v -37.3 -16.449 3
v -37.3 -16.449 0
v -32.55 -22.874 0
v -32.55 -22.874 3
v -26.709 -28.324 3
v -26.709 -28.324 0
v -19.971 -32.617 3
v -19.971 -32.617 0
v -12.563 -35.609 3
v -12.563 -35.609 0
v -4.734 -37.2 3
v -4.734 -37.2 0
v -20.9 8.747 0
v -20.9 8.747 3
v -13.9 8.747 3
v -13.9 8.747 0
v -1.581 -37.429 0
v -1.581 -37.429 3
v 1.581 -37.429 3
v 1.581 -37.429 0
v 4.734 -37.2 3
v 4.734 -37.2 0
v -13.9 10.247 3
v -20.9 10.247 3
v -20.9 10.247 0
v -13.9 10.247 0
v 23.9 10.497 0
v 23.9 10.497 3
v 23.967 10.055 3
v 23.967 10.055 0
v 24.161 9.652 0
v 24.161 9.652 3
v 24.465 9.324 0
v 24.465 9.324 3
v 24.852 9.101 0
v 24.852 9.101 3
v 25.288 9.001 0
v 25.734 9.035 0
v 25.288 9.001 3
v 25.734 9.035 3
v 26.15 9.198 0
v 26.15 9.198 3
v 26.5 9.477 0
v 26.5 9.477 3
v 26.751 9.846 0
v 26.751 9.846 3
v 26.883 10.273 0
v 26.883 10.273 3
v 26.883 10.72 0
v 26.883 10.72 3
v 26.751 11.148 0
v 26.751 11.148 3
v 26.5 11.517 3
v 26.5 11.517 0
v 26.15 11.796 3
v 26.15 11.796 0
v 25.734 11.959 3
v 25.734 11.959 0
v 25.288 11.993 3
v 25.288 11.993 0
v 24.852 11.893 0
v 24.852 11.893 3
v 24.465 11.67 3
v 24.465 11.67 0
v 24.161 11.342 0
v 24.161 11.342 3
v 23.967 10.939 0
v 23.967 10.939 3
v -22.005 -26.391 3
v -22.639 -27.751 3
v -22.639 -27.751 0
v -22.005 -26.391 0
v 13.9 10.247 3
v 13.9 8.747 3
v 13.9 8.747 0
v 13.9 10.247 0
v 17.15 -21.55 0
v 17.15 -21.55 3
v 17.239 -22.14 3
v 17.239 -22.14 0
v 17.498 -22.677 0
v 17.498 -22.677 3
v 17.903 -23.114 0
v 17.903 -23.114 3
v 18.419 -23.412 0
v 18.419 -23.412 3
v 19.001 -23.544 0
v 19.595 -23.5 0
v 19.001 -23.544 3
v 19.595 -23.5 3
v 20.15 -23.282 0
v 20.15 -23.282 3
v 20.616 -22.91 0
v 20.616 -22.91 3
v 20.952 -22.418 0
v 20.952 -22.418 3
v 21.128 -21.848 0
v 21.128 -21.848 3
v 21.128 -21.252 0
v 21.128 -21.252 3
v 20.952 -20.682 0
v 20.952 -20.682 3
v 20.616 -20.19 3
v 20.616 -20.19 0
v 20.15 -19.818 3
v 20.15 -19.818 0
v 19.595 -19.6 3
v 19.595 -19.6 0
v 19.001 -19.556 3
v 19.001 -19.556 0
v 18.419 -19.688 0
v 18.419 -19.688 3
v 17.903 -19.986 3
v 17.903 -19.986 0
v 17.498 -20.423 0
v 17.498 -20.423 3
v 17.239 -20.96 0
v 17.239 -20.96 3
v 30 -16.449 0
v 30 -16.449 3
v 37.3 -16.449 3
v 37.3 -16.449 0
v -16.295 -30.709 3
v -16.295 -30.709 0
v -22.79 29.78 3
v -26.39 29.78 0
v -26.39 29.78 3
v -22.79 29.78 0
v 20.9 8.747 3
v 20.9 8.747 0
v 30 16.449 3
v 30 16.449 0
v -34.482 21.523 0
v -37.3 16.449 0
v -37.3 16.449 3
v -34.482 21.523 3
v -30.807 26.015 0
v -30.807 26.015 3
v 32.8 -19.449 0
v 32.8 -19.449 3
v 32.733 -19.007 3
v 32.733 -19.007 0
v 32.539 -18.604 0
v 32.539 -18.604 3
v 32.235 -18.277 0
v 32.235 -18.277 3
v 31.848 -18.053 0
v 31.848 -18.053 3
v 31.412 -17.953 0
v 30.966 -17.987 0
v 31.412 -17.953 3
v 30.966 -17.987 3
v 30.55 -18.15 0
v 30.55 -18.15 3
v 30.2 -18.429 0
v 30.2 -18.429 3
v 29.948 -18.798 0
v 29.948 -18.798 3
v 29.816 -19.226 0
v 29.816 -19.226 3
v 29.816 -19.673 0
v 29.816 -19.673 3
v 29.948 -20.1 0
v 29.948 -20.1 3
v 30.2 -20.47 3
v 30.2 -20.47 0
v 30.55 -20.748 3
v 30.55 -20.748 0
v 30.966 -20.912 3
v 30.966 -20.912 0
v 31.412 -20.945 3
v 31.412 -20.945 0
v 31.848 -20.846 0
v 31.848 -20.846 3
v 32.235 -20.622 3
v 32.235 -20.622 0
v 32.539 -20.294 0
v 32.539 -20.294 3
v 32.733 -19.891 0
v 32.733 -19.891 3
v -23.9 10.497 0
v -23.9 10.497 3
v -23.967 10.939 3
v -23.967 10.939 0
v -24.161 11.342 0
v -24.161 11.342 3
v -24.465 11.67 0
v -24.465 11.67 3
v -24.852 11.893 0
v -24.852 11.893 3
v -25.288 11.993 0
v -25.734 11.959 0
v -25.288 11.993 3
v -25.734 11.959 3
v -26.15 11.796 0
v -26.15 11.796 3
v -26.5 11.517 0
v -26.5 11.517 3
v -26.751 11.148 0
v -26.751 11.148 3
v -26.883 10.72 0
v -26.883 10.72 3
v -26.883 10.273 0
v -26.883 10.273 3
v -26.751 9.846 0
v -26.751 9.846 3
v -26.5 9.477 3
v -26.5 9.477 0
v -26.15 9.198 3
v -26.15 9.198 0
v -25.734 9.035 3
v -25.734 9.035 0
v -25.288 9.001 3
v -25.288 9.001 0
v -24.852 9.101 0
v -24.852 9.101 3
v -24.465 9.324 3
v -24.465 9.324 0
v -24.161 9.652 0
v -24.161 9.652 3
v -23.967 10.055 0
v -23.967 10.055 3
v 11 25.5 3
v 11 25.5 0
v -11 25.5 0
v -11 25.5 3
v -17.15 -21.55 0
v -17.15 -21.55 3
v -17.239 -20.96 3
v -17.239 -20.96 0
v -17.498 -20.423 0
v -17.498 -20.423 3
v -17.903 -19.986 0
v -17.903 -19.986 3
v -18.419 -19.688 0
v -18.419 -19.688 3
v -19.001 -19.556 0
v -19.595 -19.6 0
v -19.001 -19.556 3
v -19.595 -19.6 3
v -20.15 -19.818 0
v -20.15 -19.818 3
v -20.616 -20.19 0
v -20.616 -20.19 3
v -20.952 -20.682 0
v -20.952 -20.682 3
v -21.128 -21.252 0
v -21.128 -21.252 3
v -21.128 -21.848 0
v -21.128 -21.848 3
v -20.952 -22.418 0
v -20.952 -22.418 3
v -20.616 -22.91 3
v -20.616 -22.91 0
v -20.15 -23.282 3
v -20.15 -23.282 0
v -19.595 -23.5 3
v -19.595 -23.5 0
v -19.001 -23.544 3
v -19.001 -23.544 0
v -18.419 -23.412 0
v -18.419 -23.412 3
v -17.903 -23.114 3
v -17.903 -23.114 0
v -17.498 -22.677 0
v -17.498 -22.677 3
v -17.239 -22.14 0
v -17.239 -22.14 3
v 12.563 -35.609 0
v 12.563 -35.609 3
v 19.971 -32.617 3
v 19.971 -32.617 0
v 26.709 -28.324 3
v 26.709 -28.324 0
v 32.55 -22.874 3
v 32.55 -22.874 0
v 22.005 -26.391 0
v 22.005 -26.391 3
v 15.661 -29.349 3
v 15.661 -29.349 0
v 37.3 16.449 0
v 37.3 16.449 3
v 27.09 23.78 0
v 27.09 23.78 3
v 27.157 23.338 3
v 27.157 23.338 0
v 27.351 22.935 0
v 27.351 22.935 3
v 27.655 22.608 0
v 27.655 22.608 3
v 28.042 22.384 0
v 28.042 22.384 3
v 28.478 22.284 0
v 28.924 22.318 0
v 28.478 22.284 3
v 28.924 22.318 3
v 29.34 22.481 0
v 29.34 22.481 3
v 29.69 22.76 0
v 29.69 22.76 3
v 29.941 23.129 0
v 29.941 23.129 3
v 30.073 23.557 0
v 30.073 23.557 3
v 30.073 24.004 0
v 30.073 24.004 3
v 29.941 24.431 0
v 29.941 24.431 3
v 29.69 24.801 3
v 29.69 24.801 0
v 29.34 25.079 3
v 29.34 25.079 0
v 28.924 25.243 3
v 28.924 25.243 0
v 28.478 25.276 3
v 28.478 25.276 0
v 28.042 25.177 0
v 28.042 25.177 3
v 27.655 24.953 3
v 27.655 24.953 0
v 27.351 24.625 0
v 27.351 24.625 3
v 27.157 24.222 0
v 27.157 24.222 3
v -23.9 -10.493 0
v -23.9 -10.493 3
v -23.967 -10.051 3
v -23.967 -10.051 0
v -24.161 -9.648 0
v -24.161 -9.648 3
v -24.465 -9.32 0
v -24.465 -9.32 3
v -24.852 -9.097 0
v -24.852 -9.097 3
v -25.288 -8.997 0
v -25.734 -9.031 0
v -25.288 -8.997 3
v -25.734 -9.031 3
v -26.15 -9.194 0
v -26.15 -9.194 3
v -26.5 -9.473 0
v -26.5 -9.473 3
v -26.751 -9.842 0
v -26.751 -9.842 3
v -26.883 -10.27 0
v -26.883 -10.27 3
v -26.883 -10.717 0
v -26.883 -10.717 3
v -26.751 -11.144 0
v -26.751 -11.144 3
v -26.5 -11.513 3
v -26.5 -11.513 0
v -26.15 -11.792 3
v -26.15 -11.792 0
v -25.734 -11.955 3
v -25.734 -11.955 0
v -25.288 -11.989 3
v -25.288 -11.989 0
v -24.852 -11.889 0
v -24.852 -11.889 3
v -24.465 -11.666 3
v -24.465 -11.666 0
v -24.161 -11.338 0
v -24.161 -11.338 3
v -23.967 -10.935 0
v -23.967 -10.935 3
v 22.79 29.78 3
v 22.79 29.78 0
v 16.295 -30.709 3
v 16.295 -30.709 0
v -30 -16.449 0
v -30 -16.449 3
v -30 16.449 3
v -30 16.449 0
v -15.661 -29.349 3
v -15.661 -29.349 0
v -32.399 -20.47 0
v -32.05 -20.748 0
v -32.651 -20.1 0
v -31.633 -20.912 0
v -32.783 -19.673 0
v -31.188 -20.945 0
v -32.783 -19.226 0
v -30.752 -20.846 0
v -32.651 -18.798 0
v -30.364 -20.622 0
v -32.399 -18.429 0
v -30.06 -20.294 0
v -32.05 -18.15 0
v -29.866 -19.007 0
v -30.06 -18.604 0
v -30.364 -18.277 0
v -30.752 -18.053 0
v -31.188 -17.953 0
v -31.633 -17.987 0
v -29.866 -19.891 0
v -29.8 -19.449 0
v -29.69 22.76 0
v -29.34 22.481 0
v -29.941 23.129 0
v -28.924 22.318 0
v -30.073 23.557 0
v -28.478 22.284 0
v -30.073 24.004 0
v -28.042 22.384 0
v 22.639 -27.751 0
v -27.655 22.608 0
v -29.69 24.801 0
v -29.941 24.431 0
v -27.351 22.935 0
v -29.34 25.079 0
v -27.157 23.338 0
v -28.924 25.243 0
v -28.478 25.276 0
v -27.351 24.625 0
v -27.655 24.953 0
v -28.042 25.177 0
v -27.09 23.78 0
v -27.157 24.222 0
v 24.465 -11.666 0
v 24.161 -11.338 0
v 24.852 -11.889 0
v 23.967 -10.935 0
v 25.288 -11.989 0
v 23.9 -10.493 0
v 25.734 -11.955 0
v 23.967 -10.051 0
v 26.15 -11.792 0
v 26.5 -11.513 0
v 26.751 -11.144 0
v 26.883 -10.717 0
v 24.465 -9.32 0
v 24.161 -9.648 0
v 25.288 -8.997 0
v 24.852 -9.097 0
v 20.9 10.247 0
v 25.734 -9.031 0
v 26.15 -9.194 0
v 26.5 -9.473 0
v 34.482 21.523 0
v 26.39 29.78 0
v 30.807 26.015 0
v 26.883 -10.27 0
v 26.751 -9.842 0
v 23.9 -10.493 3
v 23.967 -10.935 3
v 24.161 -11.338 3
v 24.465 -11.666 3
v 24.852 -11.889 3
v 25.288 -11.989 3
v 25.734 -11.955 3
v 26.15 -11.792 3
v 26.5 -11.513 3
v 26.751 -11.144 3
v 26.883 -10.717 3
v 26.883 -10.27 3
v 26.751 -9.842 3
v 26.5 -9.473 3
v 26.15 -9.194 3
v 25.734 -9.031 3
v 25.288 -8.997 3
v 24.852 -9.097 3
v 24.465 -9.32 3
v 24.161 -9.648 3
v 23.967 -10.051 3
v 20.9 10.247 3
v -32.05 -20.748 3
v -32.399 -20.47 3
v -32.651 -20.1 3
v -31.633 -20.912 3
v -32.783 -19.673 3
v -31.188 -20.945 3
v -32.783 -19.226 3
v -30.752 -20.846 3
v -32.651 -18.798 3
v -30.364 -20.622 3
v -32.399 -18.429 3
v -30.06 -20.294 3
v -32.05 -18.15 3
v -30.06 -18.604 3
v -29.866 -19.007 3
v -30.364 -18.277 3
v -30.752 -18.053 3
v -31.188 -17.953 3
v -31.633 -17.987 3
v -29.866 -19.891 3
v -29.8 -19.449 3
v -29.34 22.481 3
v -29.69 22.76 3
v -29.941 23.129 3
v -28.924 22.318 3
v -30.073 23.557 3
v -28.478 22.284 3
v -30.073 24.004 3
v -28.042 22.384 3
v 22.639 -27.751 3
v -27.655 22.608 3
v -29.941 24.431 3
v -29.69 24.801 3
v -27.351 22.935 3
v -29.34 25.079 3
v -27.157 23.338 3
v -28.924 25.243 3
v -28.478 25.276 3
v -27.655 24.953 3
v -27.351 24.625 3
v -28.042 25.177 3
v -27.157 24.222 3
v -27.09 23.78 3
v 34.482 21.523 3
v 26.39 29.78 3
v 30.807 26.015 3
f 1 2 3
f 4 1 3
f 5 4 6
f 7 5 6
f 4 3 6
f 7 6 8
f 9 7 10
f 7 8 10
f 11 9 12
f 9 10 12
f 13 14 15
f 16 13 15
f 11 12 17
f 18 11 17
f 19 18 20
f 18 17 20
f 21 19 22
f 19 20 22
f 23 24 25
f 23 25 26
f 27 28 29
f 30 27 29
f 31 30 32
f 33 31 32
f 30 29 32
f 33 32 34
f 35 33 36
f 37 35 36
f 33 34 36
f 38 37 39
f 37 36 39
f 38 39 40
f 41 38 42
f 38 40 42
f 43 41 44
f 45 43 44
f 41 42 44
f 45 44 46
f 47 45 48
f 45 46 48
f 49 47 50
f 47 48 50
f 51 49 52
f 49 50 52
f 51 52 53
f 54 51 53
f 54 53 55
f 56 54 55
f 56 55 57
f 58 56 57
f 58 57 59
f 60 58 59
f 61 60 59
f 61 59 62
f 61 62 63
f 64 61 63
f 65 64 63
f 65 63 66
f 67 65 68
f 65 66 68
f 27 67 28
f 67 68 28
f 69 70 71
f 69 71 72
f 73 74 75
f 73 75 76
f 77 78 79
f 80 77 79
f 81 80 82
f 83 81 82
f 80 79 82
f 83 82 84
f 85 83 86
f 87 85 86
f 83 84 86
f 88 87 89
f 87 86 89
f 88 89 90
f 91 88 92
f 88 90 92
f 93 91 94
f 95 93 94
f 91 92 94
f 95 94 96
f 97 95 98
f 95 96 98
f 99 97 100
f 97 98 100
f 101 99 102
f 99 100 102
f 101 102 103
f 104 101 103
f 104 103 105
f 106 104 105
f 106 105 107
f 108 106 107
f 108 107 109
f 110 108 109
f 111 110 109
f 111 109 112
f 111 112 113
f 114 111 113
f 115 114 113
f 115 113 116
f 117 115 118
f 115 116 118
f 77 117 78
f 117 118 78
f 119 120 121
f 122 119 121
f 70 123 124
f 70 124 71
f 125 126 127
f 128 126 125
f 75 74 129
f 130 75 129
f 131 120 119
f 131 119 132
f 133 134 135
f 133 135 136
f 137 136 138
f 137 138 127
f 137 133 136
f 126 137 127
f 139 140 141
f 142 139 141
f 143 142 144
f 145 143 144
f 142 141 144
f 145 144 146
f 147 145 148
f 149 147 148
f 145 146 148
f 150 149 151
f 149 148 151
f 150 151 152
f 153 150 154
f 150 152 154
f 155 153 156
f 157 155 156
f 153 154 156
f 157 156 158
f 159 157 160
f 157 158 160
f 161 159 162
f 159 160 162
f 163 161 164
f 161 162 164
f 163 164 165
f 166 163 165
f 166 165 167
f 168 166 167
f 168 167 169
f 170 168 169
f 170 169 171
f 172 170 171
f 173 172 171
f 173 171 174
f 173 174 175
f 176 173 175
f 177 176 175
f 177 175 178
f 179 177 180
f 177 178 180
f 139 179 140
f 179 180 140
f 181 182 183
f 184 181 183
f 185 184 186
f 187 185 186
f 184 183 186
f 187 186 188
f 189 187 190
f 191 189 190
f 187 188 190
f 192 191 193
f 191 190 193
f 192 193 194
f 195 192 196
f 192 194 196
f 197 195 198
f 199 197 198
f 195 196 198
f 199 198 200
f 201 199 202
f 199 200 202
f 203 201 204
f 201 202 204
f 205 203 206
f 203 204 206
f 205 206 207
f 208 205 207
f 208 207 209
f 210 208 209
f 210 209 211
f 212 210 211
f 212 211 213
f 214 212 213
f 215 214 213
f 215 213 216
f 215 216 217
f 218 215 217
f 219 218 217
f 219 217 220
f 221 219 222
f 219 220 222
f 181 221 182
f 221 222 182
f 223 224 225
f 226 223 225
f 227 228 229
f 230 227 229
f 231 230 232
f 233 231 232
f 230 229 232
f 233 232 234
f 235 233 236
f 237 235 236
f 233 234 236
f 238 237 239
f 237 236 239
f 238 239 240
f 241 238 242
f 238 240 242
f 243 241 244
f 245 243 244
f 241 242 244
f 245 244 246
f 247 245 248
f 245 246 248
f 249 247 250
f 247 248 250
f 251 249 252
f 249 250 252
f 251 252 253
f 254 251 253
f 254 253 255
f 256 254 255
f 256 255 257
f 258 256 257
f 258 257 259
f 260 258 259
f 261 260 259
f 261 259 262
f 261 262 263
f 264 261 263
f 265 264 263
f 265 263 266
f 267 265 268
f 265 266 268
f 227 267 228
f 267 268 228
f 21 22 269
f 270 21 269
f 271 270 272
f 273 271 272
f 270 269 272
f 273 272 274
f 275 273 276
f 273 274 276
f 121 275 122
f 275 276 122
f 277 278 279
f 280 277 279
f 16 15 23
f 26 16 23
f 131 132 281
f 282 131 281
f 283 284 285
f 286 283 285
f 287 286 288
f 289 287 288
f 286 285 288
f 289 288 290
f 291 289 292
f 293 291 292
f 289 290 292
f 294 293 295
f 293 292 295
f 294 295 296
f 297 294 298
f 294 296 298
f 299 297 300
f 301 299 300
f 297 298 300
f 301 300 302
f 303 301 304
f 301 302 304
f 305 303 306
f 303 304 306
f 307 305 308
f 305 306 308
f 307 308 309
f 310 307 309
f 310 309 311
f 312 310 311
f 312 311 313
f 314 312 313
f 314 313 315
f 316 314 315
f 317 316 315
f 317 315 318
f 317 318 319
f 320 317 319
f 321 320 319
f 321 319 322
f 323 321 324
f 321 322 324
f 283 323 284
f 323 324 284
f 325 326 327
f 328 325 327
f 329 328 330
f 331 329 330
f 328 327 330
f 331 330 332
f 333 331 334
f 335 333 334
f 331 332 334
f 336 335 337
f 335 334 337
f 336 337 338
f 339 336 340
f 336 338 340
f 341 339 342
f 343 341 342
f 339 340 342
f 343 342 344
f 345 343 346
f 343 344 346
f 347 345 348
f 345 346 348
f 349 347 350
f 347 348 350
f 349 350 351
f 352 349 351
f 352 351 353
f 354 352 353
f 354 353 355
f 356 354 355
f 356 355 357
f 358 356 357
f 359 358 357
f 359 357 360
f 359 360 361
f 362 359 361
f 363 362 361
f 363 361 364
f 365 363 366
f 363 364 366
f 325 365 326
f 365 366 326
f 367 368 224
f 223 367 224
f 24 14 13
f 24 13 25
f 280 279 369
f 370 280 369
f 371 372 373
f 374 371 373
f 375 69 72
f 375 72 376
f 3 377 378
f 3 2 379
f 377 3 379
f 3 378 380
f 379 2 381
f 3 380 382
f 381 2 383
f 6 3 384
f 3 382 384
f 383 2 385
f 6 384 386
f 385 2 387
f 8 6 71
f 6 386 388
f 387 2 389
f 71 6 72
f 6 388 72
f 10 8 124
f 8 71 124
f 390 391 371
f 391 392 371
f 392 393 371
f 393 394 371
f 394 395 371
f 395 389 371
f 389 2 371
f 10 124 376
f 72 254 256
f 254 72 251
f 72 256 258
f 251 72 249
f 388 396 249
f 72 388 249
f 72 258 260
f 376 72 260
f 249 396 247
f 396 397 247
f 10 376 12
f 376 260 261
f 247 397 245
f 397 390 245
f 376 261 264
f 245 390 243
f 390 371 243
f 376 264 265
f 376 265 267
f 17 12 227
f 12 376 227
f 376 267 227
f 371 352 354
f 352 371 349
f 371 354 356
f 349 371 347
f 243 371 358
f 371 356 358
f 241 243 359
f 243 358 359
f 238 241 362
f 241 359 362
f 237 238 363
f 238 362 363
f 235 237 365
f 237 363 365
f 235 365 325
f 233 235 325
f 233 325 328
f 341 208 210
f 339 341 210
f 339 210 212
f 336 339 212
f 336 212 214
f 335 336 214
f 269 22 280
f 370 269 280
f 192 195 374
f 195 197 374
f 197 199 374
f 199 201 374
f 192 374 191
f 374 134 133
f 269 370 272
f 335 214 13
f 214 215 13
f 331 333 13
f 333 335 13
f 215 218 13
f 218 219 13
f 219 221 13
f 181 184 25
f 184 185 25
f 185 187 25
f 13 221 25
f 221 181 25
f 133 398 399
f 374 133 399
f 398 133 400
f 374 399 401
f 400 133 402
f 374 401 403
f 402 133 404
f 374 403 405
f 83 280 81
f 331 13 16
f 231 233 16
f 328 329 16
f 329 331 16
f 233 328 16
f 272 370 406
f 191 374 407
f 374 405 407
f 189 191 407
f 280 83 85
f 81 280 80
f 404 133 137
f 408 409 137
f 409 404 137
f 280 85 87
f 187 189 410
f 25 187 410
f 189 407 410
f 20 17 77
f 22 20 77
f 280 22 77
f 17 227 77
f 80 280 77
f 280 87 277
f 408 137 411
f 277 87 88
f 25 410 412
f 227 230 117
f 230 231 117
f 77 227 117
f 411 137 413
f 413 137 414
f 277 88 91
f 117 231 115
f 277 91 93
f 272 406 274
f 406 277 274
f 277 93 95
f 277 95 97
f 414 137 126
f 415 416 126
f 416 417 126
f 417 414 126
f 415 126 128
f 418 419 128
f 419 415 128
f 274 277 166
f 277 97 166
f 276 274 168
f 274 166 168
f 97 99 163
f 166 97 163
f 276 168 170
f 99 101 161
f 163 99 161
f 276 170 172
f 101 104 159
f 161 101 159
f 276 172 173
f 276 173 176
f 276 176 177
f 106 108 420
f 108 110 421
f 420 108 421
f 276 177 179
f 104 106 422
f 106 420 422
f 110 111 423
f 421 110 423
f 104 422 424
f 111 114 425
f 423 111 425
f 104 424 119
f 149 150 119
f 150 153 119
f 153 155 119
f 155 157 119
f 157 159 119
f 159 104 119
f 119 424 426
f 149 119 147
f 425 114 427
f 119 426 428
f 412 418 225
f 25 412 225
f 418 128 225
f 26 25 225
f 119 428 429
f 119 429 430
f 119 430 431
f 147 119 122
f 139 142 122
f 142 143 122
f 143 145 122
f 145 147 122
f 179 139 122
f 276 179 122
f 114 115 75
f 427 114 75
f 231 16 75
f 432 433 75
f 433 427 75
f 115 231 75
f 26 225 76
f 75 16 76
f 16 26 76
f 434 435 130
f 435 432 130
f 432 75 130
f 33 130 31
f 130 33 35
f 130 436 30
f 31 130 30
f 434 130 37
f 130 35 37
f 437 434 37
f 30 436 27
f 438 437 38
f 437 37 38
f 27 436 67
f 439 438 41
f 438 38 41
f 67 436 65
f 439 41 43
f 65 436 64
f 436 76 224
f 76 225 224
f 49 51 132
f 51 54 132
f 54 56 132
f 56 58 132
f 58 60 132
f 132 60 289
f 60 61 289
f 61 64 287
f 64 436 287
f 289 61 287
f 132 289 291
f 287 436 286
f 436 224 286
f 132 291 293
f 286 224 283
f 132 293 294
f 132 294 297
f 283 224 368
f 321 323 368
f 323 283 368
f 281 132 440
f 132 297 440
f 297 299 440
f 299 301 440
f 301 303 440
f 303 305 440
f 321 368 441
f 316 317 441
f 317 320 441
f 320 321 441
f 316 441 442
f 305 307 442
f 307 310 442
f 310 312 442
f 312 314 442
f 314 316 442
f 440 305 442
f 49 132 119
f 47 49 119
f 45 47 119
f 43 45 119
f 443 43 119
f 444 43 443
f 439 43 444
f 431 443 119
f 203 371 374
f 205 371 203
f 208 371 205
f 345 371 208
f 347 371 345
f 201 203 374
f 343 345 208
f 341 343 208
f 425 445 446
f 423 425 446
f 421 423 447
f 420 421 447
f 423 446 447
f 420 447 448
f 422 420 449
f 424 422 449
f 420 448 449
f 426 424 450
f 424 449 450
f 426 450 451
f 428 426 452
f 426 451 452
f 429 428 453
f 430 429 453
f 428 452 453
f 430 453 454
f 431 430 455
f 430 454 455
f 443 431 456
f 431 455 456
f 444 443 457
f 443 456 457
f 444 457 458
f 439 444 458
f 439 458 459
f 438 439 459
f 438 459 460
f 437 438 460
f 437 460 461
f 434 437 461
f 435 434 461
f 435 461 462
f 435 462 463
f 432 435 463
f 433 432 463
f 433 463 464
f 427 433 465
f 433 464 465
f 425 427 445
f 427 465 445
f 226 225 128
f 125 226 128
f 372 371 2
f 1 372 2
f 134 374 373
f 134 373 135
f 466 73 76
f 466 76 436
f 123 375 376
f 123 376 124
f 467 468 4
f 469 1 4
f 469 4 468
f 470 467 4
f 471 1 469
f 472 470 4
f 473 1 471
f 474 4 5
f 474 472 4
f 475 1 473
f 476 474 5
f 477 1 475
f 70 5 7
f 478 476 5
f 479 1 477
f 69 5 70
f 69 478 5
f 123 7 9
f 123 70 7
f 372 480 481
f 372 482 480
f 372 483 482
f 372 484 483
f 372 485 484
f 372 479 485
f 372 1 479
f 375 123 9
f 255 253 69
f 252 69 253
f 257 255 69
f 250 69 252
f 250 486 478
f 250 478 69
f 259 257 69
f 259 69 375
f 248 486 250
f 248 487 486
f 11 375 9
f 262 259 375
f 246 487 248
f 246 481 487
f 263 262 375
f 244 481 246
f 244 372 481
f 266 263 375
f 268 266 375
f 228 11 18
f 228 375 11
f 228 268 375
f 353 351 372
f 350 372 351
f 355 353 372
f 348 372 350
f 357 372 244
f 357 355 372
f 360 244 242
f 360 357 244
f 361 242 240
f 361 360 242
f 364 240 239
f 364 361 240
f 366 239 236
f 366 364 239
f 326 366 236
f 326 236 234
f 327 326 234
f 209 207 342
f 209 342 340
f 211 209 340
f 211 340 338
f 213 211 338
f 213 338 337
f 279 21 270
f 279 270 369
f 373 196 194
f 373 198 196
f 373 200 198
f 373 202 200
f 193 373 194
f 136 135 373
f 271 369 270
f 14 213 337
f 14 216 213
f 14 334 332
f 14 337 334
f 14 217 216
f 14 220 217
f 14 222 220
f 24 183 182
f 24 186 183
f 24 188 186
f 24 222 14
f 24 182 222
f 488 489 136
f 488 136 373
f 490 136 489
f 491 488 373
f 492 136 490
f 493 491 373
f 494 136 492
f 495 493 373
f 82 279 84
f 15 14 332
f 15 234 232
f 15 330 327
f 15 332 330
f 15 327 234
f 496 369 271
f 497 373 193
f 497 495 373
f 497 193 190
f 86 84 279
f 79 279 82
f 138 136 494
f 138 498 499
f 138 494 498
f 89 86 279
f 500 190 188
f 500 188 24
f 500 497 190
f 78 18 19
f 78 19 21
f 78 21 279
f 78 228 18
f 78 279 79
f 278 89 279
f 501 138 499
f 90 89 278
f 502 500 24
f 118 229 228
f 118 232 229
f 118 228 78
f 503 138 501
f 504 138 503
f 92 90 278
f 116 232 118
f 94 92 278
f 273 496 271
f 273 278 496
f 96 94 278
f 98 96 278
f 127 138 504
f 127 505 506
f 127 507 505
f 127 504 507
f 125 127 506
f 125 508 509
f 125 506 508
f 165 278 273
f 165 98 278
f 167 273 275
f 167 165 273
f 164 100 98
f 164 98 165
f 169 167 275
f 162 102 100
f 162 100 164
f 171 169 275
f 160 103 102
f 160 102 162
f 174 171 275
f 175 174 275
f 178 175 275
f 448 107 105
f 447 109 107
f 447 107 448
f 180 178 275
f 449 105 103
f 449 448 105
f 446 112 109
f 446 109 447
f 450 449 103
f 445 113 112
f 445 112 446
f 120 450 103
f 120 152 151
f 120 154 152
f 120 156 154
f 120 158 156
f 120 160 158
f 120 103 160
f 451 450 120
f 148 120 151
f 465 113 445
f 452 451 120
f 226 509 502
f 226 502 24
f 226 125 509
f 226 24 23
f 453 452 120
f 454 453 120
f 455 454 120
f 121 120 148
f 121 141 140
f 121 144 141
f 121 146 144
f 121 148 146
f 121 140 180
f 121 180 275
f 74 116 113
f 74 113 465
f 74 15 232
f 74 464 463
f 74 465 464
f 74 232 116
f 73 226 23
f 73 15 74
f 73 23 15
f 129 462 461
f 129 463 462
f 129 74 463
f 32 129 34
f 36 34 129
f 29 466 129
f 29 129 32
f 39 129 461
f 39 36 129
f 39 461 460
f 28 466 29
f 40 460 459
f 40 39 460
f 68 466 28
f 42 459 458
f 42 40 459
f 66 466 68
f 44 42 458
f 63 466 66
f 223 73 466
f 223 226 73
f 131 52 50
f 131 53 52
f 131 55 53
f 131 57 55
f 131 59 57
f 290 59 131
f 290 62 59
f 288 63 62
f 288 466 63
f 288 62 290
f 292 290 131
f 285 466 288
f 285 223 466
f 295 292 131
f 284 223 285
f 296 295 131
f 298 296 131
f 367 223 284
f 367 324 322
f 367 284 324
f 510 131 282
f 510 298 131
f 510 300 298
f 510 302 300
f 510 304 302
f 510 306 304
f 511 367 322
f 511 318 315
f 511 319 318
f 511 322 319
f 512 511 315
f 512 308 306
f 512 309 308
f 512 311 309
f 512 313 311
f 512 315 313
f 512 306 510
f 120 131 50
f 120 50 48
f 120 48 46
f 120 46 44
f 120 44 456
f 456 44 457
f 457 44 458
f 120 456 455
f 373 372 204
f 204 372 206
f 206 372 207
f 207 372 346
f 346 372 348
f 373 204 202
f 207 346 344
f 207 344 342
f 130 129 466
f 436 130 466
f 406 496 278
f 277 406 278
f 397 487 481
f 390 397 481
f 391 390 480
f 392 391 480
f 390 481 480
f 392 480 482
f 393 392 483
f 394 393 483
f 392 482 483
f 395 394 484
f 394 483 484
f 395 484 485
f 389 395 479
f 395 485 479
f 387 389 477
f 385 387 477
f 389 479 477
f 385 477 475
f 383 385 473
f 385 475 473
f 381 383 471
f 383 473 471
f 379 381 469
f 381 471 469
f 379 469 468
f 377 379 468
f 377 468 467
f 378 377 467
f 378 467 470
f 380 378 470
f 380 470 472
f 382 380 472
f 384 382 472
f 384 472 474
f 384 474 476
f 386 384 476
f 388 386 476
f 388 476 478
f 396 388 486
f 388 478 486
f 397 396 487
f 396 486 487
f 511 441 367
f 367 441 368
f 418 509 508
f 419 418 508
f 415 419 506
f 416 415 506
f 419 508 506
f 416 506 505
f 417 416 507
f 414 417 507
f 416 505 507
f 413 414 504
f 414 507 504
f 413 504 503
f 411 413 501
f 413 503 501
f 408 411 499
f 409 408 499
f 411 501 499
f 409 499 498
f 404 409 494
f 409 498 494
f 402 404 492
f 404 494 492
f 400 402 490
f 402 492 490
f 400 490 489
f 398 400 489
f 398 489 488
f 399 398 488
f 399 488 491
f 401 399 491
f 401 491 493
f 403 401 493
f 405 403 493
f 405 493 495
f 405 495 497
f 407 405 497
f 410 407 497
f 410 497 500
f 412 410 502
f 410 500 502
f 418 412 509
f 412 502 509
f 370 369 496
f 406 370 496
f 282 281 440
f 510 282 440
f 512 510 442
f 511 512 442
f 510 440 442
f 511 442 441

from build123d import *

# Parameters (mm, degrees)
BOSS_EXTRUDE1_DEPTH = 3
SKETCH2_R           = 1.5
CUT_EXTRUDE3_DEPTH  = 3
CUT_EXTRUDE4_START  = -10
CUT_EXTRUDE4_DEPTH  = 10
BOSS_EXTRUDE2_START = -3
BOSS_EXTRUDE2_DEPTH = 3
SKETCH5_W           = 0.56
SKETCH5_H           = 32.898596714
CUT_EXTRUDE5_DEPTH  = 3
SKETCH6_W           = 0.2
SKETCH6_H           = 32.898596714
CUT_EXTRUDE6_DEPTH  = 3
SKETCH7_R           = 2
CUT_EXTRUDE8_DEPTH  = 3
BOSS_EXTRUDE3_START = -3
BOSS_EXTRUDE3_DEPTH = 3
CUT_EXTRUDE9_START  = -3
CUT_EXTRUDE9_DEPTH  = 3
BOSS_EXTRUDE5_START = -3
BOSS_EXTRUDE5_DEPTH = 3
SKETCH11_R          = 1.5
CUT_EXTRUDE10_DEPTH = 3
CUT_EXTRUDE11_DEPTH = 3
SKETCH13_W          = 7
SKETCH13_H          = 1.5
CUT_EXTRUDE12_DEPTH = 3
SKETCH14_R          = 1.5
CUT_EXTRUDE13_DEPTH = 3


with BuildPart() as part:
    # Sketch1 → Boss-Extrude1 (new body)
    with BuildSketch(Plane.XY):
        with BuildLine():
            Line((-11, 25.5), (-22.790038711, 29.780264196))
            ThreePointArc((-22.790038711, 29.780264196), (0, -37.5), (22.790038711, 29.780264196))
            Line((22.790038711, 29.780264196), (11, 25.5))
            Line((11, 25.5), (-11, 25.5))
        make_face()
    extrude(amount=BOSS_EXTRUDE1_DEPTH)

    # Sketch2 → Cut-Extrude3 (cut)
    with BuildSketch(Plane.XY.offset(3)):
        with Locations((-25.400000001, 10.496905453)):
            Circle(SKETCH2_R)
        with Locations((-25.399981845, -10.493094547)):
            Circle(SKETCH2_R)
        with Locations(Location((25.399981845, -10.493094547, 0), (0, 0, 180))):
            Circle(SKETCH2_R)
        with Locations(Location((25.400000001, 10.496905453, 0), (0, 0, 180))):
            Circle(SKETCH2_R)
    extrude(amount=-CUT_EXTRUDE3_DEPTH, mode=Mode.SUBTRACT)

    # Sketch3 → Cut-Extrude4 (cut)
    with BuildSketch(Plane.XY.offset(3).offset(CUT_EXTRUDE4_START)):
        with BuildLine():
            Line((-30.76, 21.449298357), (-30.76, -21.449298357))
            ThreePointArc((-30.76, -21.449298357), (-37.5, 0), (-30.76, 21.449298357))
        make_face()
        with BuildLine():
            Line((30.76, 21.449298357), (30.76, -21.449298357))
            ThreePointArc((30.76, -21.449298357), (37.5, 0), (30.76, 21.449298357))
        make_face()
    extrude(amount=CUT_EXTRUDE4_DEPTH, mode=Mode.SUBTRACT)

    # Sketch4 → Boss-Extrude2 (add)
    with BuildSketch(Plane.XY.offset(3).offset(BOSS_EXTRUDE2_START)):
        with BuildLine():
            Line((-30.76, -21.449298357), (-30.76, -16.449298357))
            Line((-30.76, -16.449298357), (-33.699711921, -16.449298357))
            ThreePointArc((-33.699711921, -16.449298357), (-32.32667034, -19.006219634), (-30.76, -21.449298357))
        make_face()
        with BuildLine():
            Line((-33.699711921, 16.449298357), (-30.76, 16.449298357))
            Line((-30.76, 16.449298357), (-30.76, 21.449298357))
            ThreePointArc((-30.76, 21.449298357), (-32.32667034, 19.006219634), (-33.699711921, 16.449298357))
        make_face()
        with BuildLine():
            Line((30.76, 21.449298357), (30.76, 16.449298357))
            Line((30.76, 16.449298357), (33.699711921, 16.449298357))
            ThreePointArc((33.699711921, 16.449298357), (32.32667034, 19.006219634), (30.76, 21.449298357))
        make_face()
        with BuildLine():
            Line((30.76, -16.449298357), (30.76, -21.449298357))
            ThreePointArc((30.76, -21.449298357), (32.32667034, -19.006219634), (33.699711921, -16.449298357))
            Line((33.699711921, -16.449298357), (30.76, -16.449298357))
        make_face()
    extrude(amount=BOSS_EXTRUDE2_DEPTH)

    # Sketch5 → Cut-Extrude5 (cut)
    with BuildSketch(Plane.XY.offset(3)):
        with Locations((-30.48, 0)):
            Rectangle(SKETCH5_W, SKETCH5_H)
        with Locations((30.48, 0)):
            Rectangle(SKETCH5_W, SKETCH5_H)
    extrude(amount=-CUT_EXTRUDE5_DEPTH, mode=Mode.SUBTRACT)

    # Sketch6 → Cut-Extrude6 (cut)
    with BuildSketch(Plane.XY.offset(3)):
        with Locations((-30.1, 0)):
            Rectangle(SKETCH6_W, SKETCH6_H)
        with Locations((30.1, 0)):
            Rectangle(SKETCH6_W, SKETCH6_H)
    extrude(amount=-CUT_EXTRUDE6_DEPTH, mode=Mode.SUBTRACT)

    # Sketch7 → Cut-Extrude8 (cut)
    with BuildSketch(Plane.XY.offset(3)):
        with Locations((-19.15, -21.55)):
            Circle(SKETCH7_R)
        with Locations(Location((19.15, -21.55, 0), (0, 0, 180))):
            Circle(SKETCH7_R)
    extrude(amount=-CUT_EXTRUDE8_DEPTH, mode=Mode.SUBTRACT)

    # Sketch8 → Boss-Extrude3 (add)
    with BuildSketch(Plane.XY.offset(3).offset(BOSS_EXTRUDE3_START)):
        with BuildLine():
            Line((-33.699711921, 16.449298357), (-37.299711921, 16.449298357))
            ThreePointArc((-37.299711921, 16.449298357), (-32.744884003, 23.851322108), (-26.390038711, 29.780264196))
            Line((-26.390038711, 29.780264196), (-22.790038711, 29.780264196))
            ThreePointArc((-22.790038711, 29.780264196), (-29.020710607, 23.749702226), (-33.699711921, 16.449298357))
        make_face()
        with BuildLine():
            Line((33.699711921, 16.449298357), (37.299711921, 16.449298357))
            ThreePointArc((37.299711921, 16.449298357), (32.744884003, 23.851322108), (26.390038711, 29.780264196))
            Line((26.390038711, 29.780264196), (22.790038711, 29.780264196))
            ThreePointArc((22.790038711, 29.780264196), (29.020710607, 23.749702226), (33.699711921, 16.449298357))
        make_face()
    extrude(amount=BOSS_EXTRUDE3_DEPTH)

    # Sketch9 → Cut-Extrude9 (cut)
    with BuildSketch(Plane.XY.offset(3).offset(CUT_EXTRUDE9_START)):
        with BuildLine():
            Line((4.733920151, -37.2), (-4.733920151, -37.2))
            ThreePointArc((-4.733920151, -37.2), (0, -37.5), (4.733920151, -37.2))
        make_face()
    extrude(amount=CUT_EXTRUDE9_DEPTH, mode=Mode.SUBTRACT)

    # Sketch10 → Boss-Extrude5 (add)
    with BuildSketch(Plane.XY.offset(3).offset(BOSS_EXTRUDE5_START)):
        with BuildLine():
            ThreePointArc((-4.733920151, -37.2), (-21.838816892, -30.484685938), (-33.699711921, -16.449298357))
            Line((-33.699711921, -16.449298357), (-37.299711921, -16.449298357))
            ThreePointArc((-37.299711921, -16.449298357), (-23.43831182, -30.624902723), (-4.733920151, -37.2))
        make_face()
        with BuildLine():
            ThreePointArc((33.699711921, -16.449298357), (21.838816892, -30.484685938), (4.733920151, -37.2))
            ThreePointArc((4.733920151, -37.2), (23.43831182, -30.624902723), (37.299711921, -16.449298357))
            Line((37.299711921, -16.449298357), (33.699711921, -16.449298357))
        make_face()
        with BuildLine():
            Line((4.733920151, -37.2), (-4.733920151, -37.2))
            ThreePointArc((-4.733920151, -37.2), (0, -37.457659609), (4.733920151, -37.2))
        make_face()
    extrude(amount=BOSS_EXTRUDE5_DEPTH)

    # Sketch11 → Cut-Extrude10 (cut)
    with BuildSketch(Plane.XY.offset(3)):
        with Locations((-28.590038711, 23.780264196)):
            Circle(SKETCH11_R)
        with Locations(Location((28.590038711, 23.780264196, 0), (0, 0, 180))):
            Circle(SKETCH11_R)
    extrude(amount=-CUT_EXTRUDE10_DEPTH, mode=Mode.SUBTRACT)

    # Sketch12 → Cut-Extrude11 (cut)
    with BuildSketch(Plane.XY.offset(3)):
        Polygon((-22.005113558, -26.391105244), (-15.660959049, -29.349433076), (-16.294886442, -30.708894756), (-22.639040951, -27.750566924), align=None)
        Polygon((22.005113558, -26.391105244), (15.660959049, -29.349433076), (16.294886442, -30.708894756), (22.639040951, -27.750566924), align=None)
    extrude(amount=-CUT_EXTRUDE11_DEPTH, mode=Mode.SUBTRACT)

    # Sketch13 → Cut-Extrude12 (cut)
    with BuildSketch(Plane.XY.offset(3)):
        with Locations((-17.400000001, 9.496905453)):
            Rectangle(SKETCH13_W, SKETCH13_H)
        with Locations((17.400000001, 9.496905453)):
            Rectangle(SKETCH13_W, SKETCH13_H)
    extrude(amount=-CUT_EXTRUDE12_DEPTH, mode=Mode.SUBTRACT)

    # Sketch14 → Cut-Extrude13 (cut)
    with BuildSketch(Plane.XY.offset(3)):
        with Locations((-31.299711921, -19.449298357)):
            Circle(SKETCH14_R)
        with Locations((31.299711921, -19.449298357)):
            Circle(SKETCH14_R)
    extrude(amount=-CUT_EXTRUDE13_DEPTH, mode=Mode.SUBTRACT)


solid = part.part
